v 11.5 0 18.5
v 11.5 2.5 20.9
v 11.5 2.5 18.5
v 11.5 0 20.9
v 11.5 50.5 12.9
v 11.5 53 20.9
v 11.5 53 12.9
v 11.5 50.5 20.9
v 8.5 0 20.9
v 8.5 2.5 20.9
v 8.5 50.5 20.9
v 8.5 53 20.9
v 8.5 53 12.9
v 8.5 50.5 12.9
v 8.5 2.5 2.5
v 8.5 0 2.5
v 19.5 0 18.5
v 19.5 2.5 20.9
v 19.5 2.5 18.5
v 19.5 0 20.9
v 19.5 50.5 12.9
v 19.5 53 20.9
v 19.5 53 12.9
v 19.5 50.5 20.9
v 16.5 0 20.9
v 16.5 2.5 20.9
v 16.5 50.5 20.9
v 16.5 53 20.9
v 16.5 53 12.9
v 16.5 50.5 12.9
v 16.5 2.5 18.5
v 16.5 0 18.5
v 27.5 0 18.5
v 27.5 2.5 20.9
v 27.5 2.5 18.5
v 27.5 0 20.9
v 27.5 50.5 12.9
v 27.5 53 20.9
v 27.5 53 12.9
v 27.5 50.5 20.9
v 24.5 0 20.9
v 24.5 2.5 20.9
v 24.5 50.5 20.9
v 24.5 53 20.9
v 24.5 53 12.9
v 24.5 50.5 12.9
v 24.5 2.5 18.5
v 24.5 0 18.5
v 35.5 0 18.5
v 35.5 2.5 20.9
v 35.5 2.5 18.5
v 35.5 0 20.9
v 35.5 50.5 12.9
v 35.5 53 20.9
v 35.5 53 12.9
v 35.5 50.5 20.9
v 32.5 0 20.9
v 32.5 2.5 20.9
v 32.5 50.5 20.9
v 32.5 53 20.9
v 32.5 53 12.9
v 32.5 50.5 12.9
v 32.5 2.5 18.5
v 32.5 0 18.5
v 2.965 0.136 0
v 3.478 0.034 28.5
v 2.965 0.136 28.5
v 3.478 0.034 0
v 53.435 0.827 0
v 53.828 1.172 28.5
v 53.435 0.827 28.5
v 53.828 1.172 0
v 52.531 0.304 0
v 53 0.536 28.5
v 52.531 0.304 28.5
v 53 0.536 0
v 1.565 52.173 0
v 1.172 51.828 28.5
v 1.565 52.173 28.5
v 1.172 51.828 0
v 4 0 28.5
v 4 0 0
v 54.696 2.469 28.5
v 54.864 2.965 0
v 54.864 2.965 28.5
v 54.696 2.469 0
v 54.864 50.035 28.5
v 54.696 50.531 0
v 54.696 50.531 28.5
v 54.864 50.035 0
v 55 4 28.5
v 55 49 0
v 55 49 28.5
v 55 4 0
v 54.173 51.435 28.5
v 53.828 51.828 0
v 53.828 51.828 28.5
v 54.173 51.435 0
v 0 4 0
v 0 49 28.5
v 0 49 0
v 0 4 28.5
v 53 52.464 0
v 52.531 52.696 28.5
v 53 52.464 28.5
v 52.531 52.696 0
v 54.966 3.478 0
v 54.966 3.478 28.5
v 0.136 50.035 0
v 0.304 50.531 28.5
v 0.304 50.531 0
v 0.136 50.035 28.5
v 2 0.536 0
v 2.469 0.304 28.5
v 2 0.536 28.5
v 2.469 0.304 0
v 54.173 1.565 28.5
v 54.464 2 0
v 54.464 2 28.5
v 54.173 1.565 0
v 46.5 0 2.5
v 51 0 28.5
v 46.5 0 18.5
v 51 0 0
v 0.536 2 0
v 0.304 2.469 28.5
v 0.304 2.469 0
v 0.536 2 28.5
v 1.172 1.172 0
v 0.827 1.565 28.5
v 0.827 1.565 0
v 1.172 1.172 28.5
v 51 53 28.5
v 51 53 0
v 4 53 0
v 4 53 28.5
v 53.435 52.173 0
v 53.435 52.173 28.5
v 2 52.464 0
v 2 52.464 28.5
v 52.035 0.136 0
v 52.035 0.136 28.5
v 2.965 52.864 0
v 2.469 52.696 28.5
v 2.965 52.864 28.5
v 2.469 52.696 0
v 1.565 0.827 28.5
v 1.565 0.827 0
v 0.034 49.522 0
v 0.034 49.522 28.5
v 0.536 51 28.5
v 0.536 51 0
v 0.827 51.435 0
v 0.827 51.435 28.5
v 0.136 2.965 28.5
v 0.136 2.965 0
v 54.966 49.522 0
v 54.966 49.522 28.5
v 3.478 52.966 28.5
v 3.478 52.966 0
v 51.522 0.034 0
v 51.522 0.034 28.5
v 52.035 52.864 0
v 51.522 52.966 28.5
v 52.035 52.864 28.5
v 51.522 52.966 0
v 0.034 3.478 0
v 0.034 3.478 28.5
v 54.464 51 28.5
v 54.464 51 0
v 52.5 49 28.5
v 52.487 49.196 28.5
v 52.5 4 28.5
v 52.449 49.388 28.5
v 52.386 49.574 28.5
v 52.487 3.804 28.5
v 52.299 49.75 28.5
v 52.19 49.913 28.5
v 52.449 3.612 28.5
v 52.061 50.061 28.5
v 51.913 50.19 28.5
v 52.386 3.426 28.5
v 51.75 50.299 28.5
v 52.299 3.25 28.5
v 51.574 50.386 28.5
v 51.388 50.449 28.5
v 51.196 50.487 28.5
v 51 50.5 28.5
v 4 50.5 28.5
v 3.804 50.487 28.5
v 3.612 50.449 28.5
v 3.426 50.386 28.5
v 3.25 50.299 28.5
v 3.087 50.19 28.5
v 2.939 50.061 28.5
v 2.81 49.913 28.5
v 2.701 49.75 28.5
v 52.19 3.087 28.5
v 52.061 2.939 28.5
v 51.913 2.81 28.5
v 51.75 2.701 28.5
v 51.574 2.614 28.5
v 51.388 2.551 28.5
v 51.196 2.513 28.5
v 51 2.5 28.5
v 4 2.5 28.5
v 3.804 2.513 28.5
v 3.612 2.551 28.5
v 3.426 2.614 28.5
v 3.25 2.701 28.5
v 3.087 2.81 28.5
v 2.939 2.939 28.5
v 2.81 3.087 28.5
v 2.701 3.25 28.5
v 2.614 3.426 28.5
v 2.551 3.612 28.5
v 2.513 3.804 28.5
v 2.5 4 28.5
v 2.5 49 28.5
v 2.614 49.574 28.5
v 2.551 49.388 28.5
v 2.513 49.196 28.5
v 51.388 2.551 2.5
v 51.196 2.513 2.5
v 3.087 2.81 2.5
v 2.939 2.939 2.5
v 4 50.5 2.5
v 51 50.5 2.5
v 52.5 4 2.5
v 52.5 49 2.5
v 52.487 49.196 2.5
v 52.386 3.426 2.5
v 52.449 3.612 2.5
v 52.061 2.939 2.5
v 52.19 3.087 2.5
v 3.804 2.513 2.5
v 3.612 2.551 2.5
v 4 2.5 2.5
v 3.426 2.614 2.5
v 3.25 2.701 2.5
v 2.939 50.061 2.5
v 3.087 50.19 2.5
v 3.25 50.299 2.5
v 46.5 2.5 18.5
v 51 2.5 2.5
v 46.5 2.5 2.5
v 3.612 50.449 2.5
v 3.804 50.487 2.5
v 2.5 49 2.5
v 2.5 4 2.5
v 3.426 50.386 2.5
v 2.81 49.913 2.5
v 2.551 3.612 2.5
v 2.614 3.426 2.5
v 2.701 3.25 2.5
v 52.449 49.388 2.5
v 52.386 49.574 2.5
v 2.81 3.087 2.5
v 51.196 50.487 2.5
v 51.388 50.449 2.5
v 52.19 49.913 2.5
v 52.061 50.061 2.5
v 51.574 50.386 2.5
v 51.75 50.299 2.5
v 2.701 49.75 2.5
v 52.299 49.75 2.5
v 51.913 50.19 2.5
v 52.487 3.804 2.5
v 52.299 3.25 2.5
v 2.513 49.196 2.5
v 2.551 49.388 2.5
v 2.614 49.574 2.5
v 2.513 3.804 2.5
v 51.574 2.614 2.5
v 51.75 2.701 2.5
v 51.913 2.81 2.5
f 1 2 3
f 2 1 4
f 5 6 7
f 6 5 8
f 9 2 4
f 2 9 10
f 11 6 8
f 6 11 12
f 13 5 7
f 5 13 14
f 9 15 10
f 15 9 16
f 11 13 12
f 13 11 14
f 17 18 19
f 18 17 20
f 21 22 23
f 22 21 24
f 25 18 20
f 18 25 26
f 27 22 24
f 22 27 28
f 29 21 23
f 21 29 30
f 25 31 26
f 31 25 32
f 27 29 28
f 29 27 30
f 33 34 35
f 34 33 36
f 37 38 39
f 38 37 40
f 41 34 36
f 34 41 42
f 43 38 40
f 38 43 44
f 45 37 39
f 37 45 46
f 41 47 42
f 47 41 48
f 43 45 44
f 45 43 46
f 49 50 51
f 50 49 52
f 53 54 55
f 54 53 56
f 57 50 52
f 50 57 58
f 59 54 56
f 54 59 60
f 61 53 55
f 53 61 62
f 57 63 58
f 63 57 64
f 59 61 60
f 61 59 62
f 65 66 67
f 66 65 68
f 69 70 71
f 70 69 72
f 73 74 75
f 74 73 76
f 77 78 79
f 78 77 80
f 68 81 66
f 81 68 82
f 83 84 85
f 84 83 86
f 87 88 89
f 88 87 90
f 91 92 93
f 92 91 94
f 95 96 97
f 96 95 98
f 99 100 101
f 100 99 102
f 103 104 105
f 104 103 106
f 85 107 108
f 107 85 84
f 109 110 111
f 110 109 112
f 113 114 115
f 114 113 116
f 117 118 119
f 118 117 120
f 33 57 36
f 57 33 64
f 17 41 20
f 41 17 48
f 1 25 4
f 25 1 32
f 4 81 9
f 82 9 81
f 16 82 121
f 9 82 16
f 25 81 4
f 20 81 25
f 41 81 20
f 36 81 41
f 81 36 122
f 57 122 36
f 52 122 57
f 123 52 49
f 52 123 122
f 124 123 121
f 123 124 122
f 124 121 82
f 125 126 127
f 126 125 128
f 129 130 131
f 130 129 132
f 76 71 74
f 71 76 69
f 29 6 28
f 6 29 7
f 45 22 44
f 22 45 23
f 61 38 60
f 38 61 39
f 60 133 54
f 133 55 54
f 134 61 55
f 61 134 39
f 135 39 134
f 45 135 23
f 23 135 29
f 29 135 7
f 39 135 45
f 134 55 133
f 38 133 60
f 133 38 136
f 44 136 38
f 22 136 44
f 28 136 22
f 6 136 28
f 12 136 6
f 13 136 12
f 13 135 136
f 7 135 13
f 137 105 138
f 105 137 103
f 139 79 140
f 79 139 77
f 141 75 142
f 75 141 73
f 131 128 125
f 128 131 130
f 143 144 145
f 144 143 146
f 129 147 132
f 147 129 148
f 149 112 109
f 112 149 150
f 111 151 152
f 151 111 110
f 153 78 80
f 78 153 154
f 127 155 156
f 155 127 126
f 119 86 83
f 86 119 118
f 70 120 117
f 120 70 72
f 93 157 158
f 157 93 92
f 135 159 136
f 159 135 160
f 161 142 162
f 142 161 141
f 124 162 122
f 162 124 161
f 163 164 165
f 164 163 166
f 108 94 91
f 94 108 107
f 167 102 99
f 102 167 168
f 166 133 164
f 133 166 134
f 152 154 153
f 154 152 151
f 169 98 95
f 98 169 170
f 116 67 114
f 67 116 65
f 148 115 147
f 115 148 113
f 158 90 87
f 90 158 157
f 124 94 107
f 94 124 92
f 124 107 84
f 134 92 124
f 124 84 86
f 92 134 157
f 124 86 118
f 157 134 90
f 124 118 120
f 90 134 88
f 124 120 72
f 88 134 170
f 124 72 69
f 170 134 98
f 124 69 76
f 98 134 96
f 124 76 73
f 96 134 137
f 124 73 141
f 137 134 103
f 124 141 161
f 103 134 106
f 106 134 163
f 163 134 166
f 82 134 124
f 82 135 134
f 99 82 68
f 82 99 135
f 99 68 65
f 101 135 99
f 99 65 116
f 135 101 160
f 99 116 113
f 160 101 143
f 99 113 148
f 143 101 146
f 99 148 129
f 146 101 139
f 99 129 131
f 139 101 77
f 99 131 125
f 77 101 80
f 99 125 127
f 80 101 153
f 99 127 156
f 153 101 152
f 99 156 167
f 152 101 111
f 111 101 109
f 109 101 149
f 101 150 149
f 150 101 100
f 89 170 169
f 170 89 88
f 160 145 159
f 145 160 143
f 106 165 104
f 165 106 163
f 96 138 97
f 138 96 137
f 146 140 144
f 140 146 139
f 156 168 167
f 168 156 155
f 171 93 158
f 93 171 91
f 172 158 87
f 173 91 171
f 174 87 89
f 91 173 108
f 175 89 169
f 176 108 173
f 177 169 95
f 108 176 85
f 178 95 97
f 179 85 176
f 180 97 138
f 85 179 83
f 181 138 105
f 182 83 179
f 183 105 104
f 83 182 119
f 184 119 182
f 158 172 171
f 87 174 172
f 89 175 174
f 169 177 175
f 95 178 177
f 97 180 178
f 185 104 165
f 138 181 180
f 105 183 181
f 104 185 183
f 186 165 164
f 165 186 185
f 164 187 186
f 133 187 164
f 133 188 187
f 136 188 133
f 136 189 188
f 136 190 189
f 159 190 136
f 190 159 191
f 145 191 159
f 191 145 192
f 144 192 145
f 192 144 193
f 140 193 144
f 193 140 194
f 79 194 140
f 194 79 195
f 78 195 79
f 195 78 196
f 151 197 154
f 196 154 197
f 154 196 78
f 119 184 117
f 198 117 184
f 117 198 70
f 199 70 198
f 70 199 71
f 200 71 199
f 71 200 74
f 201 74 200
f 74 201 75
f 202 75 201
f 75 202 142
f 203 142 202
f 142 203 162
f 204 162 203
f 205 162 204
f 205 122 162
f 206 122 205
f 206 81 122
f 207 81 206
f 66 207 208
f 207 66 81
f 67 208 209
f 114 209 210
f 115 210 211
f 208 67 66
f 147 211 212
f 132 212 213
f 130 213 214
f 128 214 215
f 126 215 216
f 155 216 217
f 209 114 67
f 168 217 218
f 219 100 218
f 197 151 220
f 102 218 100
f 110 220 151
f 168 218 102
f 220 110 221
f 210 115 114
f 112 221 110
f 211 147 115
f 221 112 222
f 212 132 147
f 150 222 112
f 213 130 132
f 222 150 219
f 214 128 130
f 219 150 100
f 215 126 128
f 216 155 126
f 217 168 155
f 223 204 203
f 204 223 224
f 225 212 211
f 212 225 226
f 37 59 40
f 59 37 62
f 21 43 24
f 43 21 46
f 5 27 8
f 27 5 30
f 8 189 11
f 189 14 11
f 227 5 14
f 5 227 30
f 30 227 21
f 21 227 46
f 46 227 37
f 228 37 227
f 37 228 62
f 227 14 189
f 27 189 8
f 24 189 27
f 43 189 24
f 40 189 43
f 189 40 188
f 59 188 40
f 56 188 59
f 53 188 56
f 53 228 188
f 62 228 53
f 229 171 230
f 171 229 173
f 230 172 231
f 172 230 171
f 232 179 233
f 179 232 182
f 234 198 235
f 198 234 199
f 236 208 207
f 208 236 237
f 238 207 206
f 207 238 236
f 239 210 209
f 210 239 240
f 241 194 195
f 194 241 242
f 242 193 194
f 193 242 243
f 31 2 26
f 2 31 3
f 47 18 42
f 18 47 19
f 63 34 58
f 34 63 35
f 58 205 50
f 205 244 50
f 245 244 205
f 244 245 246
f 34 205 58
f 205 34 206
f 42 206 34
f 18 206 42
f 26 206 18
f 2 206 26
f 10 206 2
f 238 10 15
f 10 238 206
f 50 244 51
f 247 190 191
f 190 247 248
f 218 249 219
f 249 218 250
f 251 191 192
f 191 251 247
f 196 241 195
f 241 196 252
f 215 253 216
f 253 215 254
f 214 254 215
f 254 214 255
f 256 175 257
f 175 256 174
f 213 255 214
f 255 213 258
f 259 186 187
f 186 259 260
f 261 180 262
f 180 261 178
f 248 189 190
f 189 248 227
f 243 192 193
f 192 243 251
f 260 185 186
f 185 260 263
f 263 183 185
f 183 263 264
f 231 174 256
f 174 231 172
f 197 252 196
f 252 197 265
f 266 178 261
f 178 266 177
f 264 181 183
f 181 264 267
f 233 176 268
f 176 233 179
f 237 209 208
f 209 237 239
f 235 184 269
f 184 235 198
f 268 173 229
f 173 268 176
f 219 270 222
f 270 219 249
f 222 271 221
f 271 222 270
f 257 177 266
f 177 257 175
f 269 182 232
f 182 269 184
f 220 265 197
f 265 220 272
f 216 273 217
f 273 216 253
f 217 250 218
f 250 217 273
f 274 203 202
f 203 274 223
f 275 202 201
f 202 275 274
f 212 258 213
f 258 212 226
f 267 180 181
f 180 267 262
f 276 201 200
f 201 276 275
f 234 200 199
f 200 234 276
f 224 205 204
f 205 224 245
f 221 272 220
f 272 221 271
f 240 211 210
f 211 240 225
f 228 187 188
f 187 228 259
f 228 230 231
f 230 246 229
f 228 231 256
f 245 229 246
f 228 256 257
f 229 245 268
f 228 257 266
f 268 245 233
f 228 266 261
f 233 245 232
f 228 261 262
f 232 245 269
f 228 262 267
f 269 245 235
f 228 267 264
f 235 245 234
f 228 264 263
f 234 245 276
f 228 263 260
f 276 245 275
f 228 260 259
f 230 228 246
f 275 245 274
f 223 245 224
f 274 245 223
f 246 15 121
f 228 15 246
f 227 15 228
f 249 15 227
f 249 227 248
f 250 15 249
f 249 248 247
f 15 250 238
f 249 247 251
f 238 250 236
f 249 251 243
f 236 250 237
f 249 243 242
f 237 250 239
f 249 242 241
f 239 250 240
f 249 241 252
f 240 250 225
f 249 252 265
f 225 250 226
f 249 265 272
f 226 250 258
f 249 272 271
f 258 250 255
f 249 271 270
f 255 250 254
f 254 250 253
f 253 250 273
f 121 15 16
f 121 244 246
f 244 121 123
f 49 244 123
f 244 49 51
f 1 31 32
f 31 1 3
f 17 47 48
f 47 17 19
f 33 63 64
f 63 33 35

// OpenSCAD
// ===== ELM327 WiFi Enclosure (plugs directly into OBD port) =====
// ⚠️ MEASURE YOUR UNIT and overwrite these 5 numbers:
body_l = 48;     // body length (no connector)
body_w = 46;     // body width
body_h = 25;     // body height
conn_w = 38;     // OBD connector width
conn_h = 16;     // OBD connector height

part   = "base"; // "base" or "lid"
clear  = 1.0;    // gap around adapter
wall   = 2.5;    // wall thickness
corner = 4;      // corner radius
$fn    = 48;

iw = body_w + clear*2;
il = body_l + clear*2;
ih = body_h + clear;
ow = iw + wall*2;
ol = il + wall*2;

module rbox(l, w, h, r) {
    hull() for (x=[r, l-r], y=[r, w-r])
        translate([x, y, 0]) cylinder(r=r, h=h);
}

module base() {
    difference() {
        rbox(ol, ow, ih+wall, corner);
        translate([wall, wall, wall])
            rbox(il, iw, ih+wall, corner-wall);
        // FRONT fully open for OBD plug to stick out into car port
        translate([ol/2 - conn_w/2, -1, wall])
            cube([conn_w, wall+2, conn_h]);
        // side vents
        for (i=[0:3])
            translate([wall+6+i*8, -1, wall+ih*0.4])
                cube([3, ow+2, 8]);
    }
}

module lid() {
    difference() {
        rbox(ol, ow, wall, corner);
        // LED window (4 holes)
        for (i=[0:3])
            translate([ol/2-12+i*8, ow*0.30, -1])
                cylinder(d=4, h=wall+2);
    }
    // snap lip
    translate([wall+0.3, wall+0.3, -3])
        difference() {
            rbox(il-0.6, iw-0.6, 3, corner-wall);
            translate([wall, wall, -1])
                rbox(il-0.6-wall*2, iw-0.6-wall*2, 5, 1);
        }
}

if (part == "base") base(); else lid();
